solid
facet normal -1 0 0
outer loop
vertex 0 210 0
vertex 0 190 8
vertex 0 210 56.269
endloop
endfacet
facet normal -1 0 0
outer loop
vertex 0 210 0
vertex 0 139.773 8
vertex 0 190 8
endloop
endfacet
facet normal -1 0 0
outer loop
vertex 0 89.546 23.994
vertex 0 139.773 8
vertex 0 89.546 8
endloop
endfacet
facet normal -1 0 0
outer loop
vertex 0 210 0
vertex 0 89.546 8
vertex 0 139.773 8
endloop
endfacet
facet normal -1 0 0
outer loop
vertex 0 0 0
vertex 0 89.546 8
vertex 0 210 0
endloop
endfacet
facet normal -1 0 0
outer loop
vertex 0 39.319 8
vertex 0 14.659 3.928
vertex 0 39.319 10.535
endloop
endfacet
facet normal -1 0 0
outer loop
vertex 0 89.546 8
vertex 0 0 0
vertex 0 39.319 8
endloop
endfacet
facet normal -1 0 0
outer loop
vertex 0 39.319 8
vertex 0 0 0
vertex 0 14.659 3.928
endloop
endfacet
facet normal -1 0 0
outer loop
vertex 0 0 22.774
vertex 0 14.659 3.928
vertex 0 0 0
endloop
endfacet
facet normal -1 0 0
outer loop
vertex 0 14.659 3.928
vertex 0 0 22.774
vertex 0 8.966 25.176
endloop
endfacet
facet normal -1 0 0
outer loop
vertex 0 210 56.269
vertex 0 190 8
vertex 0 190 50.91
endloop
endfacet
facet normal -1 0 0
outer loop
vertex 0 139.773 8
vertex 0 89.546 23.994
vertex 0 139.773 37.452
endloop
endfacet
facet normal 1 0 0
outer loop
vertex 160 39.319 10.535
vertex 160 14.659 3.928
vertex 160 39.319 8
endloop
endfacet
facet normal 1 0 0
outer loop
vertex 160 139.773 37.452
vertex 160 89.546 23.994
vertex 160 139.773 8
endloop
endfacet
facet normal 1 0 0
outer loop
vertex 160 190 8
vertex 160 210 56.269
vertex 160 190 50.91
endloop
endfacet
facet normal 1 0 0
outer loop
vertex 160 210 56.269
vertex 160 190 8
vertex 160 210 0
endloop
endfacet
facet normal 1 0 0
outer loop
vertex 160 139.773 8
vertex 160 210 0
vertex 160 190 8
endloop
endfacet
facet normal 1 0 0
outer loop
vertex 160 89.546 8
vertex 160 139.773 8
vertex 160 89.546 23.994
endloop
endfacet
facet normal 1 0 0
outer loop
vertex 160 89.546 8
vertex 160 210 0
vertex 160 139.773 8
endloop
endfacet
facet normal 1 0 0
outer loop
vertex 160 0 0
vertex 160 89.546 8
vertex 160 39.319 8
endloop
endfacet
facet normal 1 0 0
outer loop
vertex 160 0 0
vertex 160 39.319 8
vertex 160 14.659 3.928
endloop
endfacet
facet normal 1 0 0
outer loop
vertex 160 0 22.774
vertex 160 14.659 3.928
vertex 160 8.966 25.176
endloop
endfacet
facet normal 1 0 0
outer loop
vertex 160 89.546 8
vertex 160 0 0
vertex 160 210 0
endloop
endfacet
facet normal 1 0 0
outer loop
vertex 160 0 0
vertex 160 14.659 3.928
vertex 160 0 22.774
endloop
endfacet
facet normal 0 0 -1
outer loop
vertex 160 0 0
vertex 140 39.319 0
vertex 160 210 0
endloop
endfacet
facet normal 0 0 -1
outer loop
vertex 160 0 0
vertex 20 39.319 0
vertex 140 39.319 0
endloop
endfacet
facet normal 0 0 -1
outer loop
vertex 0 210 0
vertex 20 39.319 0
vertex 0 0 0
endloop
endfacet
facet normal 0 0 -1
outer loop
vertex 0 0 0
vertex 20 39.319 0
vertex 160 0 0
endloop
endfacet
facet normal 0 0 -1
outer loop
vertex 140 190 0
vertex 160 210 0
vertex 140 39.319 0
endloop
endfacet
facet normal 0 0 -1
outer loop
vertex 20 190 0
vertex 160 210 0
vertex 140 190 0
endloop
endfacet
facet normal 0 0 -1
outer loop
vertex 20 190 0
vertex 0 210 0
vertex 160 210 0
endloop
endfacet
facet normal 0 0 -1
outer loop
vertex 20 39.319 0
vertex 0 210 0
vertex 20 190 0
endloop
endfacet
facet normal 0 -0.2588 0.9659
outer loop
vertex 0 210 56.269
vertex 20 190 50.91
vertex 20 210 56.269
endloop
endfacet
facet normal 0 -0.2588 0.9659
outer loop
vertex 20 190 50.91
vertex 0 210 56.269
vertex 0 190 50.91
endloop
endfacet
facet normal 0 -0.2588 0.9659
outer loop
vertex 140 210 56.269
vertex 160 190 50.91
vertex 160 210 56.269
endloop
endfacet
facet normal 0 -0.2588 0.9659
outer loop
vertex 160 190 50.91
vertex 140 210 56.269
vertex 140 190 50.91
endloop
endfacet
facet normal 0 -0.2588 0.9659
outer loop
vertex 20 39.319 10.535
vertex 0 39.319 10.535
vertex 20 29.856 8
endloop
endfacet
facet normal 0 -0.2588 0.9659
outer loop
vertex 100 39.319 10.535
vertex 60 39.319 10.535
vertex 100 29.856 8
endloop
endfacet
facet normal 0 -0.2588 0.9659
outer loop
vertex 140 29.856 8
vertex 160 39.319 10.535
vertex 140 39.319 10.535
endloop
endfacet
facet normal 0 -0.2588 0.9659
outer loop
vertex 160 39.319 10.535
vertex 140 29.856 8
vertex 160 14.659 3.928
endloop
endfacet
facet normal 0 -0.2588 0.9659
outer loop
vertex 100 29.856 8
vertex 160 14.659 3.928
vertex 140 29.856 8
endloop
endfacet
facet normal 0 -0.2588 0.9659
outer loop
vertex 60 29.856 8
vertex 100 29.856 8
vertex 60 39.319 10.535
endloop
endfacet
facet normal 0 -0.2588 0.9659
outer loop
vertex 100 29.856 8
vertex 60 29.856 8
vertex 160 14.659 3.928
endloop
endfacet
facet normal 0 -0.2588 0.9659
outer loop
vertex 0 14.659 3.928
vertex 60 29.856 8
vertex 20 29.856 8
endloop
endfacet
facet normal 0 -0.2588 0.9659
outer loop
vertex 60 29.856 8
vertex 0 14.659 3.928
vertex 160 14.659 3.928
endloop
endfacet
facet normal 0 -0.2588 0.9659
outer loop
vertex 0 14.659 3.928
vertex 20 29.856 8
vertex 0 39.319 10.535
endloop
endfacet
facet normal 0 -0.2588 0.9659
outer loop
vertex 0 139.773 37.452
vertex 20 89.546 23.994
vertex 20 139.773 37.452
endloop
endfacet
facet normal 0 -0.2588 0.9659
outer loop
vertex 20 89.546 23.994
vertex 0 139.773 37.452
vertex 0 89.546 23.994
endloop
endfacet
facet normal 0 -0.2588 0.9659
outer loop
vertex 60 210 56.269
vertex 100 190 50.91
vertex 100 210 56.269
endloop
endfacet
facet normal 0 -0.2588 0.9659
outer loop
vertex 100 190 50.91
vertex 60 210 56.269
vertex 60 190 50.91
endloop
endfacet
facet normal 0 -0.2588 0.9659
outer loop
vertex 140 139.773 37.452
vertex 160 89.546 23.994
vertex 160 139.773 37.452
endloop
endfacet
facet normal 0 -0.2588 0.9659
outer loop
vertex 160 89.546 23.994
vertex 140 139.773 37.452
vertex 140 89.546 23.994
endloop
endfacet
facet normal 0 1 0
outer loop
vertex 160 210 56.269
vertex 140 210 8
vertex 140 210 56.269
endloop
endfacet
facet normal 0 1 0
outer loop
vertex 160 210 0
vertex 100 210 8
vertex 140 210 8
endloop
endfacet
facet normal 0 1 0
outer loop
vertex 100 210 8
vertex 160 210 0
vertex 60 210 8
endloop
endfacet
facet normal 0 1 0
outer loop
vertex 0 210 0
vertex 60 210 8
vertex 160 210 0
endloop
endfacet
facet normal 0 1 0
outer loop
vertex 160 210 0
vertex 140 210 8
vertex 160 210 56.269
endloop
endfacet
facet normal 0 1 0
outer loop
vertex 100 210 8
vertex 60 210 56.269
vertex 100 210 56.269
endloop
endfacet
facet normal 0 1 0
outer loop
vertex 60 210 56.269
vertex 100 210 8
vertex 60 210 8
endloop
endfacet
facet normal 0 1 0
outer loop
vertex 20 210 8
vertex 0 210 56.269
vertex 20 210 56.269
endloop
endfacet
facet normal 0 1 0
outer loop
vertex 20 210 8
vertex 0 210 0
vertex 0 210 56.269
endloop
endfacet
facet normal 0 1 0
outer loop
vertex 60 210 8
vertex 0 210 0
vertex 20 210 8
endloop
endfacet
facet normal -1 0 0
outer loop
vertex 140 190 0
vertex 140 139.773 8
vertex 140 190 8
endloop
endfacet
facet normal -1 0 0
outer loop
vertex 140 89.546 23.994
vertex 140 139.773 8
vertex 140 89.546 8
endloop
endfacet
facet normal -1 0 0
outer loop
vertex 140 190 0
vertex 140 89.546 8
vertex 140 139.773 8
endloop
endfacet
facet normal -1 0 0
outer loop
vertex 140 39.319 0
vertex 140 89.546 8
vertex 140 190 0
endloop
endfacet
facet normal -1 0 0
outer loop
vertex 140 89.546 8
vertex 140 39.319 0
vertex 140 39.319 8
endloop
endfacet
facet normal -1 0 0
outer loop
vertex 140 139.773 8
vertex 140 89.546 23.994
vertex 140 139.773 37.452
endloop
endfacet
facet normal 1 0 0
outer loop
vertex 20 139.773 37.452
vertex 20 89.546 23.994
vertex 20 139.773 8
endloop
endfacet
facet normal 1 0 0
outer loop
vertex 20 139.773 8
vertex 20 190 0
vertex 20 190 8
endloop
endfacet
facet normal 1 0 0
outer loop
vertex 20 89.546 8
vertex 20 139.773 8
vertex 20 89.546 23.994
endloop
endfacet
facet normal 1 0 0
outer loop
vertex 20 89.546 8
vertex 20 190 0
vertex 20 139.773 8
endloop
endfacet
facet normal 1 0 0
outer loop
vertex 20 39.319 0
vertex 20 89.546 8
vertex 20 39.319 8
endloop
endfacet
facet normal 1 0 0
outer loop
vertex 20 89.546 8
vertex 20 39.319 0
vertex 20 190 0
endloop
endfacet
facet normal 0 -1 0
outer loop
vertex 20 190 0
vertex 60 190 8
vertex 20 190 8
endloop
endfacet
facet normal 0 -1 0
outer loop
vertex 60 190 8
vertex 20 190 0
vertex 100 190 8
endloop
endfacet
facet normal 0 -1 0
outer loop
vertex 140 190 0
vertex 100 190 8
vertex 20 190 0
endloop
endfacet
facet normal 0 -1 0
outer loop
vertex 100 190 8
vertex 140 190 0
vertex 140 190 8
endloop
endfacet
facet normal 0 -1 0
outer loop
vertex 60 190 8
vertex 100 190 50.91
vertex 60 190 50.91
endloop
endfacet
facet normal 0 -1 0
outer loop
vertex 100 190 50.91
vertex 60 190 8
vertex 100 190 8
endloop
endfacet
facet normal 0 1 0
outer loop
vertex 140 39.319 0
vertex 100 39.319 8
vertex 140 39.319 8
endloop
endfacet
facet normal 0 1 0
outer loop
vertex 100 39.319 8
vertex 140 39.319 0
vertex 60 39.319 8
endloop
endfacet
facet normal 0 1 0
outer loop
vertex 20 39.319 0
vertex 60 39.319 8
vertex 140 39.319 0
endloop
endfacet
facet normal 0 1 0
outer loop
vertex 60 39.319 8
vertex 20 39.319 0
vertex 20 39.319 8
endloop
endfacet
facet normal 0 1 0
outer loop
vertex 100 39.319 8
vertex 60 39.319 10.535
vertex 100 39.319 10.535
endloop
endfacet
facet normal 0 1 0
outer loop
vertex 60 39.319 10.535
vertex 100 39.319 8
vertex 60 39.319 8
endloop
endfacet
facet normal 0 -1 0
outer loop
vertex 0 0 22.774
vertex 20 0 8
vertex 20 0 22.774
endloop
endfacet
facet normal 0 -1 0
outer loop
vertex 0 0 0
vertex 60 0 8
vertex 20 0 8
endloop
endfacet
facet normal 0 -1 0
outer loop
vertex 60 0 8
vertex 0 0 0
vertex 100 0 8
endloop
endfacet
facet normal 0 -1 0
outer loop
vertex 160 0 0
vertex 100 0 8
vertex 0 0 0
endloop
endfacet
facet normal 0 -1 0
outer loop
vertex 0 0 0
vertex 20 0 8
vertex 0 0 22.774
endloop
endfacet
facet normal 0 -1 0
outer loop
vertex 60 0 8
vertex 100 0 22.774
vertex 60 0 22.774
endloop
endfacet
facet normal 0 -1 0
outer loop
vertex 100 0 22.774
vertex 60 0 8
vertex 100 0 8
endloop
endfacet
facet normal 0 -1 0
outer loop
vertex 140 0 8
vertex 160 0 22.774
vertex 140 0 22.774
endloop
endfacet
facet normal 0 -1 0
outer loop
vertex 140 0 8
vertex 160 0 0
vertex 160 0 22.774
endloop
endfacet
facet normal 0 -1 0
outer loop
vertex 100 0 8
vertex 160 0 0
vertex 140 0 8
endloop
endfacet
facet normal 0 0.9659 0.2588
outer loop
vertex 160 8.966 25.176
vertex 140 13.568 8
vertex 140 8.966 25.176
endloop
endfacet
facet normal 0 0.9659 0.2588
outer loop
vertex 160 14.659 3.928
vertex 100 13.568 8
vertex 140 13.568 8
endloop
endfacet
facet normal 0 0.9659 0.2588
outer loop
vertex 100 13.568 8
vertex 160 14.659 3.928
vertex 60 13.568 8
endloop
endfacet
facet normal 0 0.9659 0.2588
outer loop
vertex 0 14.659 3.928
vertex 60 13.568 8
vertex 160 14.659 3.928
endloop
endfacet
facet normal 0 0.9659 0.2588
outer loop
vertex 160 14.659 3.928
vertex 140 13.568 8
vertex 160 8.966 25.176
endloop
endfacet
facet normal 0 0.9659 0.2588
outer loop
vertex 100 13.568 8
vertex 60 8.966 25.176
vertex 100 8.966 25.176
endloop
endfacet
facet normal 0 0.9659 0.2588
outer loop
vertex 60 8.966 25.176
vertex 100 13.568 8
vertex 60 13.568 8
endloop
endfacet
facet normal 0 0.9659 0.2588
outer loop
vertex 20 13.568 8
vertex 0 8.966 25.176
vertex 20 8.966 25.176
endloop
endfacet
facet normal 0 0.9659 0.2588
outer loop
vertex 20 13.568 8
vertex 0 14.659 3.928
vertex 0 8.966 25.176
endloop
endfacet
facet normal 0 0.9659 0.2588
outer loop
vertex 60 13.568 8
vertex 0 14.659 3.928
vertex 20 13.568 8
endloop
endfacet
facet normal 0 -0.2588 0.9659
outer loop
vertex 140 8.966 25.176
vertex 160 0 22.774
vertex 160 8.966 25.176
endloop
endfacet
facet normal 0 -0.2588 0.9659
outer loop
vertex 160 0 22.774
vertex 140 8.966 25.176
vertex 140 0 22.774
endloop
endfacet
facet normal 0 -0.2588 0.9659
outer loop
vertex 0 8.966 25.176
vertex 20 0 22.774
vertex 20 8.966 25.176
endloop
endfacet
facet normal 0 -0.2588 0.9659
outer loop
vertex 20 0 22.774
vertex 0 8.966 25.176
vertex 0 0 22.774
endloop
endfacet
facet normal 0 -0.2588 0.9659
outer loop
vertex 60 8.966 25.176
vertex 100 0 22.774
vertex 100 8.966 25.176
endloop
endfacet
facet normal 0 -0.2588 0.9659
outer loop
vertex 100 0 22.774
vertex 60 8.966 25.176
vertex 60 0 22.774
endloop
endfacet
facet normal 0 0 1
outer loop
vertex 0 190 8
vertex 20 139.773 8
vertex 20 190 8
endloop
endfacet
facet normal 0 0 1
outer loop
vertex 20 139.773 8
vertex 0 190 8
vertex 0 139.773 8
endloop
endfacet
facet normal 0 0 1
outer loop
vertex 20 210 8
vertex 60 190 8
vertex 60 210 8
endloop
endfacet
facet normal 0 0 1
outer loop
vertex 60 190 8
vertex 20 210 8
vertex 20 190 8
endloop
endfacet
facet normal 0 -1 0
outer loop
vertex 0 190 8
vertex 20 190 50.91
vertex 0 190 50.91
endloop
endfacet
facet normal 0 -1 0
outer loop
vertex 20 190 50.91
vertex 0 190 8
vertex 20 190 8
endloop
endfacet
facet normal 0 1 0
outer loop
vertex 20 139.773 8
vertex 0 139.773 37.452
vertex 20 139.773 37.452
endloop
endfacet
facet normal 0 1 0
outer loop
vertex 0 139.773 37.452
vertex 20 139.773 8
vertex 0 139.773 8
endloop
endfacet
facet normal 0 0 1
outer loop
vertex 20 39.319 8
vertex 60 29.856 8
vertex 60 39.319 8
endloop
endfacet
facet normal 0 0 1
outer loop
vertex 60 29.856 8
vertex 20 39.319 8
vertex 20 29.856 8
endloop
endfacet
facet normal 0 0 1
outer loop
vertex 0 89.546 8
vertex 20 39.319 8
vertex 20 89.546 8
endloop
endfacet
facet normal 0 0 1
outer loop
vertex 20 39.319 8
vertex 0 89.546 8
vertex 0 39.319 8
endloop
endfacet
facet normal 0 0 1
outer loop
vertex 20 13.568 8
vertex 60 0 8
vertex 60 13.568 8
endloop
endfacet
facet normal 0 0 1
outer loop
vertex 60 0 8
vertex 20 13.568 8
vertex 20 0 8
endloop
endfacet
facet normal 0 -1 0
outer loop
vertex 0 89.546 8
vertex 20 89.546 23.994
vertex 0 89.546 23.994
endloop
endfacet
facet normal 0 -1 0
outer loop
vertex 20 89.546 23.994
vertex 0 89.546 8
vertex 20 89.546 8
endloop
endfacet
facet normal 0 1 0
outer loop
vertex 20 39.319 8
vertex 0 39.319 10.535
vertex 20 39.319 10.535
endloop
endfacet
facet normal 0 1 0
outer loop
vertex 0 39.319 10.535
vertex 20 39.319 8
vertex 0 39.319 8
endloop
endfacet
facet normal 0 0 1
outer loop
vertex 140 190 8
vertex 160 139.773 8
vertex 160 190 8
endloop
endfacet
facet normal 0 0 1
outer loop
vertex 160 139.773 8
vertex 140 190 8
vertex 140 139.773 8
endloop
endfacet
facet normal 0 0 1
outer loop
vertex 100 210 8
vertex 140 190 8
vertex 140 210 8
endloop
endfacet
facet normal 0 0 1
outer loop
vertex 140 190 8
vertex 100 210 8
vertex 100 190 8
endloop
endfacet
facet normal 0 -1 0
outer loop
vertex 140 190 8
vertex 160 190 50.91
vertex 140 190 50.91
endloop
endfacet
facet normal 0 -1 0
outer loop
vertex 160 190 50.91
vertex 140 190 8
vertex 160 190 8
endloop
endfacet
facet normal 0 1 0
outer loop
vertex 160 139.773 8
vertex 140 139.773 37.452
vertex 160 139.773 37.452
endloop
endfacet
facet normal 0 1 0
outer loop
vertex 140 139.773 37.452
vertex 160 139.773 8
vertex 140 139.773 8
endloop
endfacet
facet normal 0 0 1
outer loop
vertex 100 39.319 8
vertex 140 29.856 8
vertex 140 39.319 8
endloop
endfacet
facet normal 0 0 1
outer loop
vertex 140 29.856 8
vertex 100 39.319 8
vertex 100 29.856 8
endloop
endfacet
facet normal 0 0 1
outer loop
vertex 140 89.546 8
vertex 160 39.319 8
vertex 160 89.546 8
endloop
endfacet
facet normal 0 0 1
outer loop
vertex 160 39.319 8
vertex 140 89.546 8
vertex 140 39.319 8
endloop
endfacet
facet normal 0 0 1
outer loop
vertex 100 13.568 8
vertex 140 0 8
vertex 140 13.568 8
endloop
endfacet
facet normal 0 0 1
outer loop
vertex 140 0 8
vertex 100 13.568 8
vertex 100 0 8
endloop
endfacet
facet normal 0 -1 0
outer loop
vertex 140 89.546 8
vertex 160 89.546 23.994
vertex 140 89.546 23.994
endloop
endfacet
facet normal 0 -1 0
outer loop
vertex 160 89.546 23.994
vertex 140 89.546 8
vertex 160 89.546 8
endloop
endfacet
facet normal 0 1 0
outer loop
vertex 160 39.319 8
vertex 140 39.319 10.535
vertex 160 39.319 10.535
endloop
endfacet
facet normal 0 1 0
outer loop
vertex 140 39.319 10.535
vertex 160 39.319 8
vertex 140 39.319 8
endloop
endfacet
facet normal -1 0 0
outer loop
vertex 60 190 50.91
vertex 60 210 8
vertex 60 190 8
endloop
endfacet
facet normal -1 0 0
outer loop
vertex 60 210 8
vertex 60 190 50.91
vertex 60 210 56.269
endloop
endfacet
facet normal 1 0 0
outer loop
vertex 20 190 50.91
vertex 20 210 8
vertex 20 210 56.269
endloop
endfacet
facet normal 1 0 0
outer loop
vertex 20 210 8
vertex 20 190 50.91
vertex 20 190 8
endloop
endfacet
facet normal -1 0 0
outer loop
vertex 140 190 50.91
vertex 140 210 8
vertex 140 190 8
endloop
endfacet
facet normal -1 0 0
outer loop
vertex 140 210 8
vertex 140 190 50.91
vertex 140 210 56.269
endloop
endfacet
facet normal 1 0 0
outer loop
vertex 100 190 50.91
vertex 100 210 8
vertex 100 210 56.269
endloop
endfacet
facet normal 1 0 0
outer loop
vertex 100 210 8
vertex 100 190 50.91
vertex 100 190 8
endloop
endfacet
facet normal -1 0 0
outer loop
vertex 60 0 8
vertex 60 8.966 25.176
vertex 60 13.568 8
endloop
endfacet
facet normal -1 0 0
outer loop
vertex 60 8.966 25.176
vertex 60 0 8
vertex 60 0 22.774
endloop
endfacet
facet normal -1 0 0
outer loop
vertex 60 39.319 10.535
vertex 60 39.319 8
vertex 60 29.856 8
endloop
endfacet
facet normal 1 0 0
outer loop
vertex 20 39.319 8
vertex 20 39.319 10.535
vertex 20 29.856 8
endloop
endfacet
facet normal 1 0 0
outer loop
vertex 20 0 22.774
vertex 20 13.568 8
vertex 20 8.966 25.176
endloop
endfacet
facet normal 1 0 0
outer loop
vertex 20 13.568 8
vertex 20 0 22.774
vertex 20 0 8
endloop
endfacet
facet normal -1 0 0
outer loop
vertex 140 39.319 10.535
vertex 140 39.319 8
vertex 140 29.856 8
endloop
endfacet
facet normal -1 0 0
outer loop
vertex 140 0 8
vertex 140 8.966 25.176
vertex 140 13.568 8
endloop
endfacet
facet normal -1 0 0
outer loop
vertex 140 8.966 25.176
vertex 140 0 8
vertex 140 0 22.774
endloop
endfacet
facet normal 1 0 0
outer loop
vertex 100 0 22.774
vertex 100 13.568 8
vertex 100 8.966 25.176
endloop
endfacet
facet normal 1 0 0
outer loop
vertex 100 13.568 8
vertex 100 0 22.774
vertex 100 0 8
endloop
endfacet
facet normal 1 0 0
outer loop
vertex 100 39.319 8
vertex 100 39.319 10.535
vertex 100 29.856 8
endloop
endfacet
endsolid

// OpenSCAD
/* This file contains a desktop speaker stand that serves
   two purposes; (I) get the speaker off the desk (possibly
   onto some foam or other anti-vibrational material), and
   (II) tilt the speaker towards your ear.
*/

/** BODY PARAMS **/
l = 210;   // length (along desk) in mm
w = 160;   // width in mm
a = 15;    // angle in degrees
t = 20;    // thickness in mm
p = true ; // pillars / solid shape
s = 8;     // support frame height in mm (only if p)
f = true ; // with / without front pillar (only if p)

/** REAR PARAMS **/
rl = 20; // length (along tilted surface) in mm
rh = 20; // height in mm

/** AUTO-TUNED BODY PARAMS **/
h = tan(a) * l;                 // height in mm
hl = l - t - t - (cos(a) * rl); // hole length in mm
hw = w - t - t;                 // hole width in mm
ho = t + (cos(a) * rl);         // hole offset in mm

/** AUTO-TUNED REAR PARAMS **/
rw = w;                          // width in mm
aro = rh - (sin(90-a) * (rh*2)); //after-rotation-offset (z axis) in mm

/** MAIN **/
if (p) {
 difference(){
  union(){
   body();
   rear();
  }
  pillars();
 }
} else {
 body();
 rear();
}

/** MODULES **/
module body(){
difference(){
 hull(){
  polyhedron(//0       1       2       3       4       5       6
       points=[[0,0,0],[w,0,0],[w,l,0],[0,l,0],[w,0,0],[w,l,h],[0,l,h]],
       faces=[[0,1,2,3], [0,1,5,6], [2,3,5,6], [0,3,6], [1,2,5]]);
 }
 translate([t, ho, -1]){
     cube([hw, hl, h + 2]);
 }
}
}

module rear(){
difference(){
 translate([0,0,aro]){
  rotate([a, 0, 0]) {
      cube([rw, rl, rh*2]);
  }
 }
 union(){
  translate([-1, - rh, - rh]) {
      cube([rw + 2, rh, rh * 3]);
  }
  translate([-1, - 1, - (rh*2)]) {
      cube([rw + 2, rl*2, rh*2]);
  }
 }
}
}

module pillars(){
union(){
 union(){
  union(){
   union(){ // left structure frame
    translate([-1, ho + (2*(hl/3)), s]){
        cube([t+2, hl/3, h]);
    }
    translate([-1, ho, s]){
        cube([t+2, hl/3, h]);
    }
   }
   union(){ // right structure frame
    translate([hw + t - 1, ho + (2*(hl/3)), s]){
        cube([t+2, hl/3, h]);
    }
    translate([hw + t - 1, ho, s]){
        cube([t+2, hl/3, h]);
    }
   }
  }
  if(f) { // front structure frame
   union(){
    translate([t, ho + hl-1, s]){
        cube([hw/3, t+2, h]);
    }
    translate([t + (2 * (hw/3)), ho + hl-1, s]){
        cube([hw/3, t+2, h]);
    }
   }
  } else {
   translate([t, ho + hl-1, s]){
       cube([hw, t+2, h]);
   }
  }
 }
 union(){ // back structure frame
  translate([t, -1, s]){
      cube([hw/3, ho+2, h]);
  }
  translate([t + (2 * (hw/3)), -1, s]){
      cube([hw/3, ho+2, h]);
  }
 }
}
}
